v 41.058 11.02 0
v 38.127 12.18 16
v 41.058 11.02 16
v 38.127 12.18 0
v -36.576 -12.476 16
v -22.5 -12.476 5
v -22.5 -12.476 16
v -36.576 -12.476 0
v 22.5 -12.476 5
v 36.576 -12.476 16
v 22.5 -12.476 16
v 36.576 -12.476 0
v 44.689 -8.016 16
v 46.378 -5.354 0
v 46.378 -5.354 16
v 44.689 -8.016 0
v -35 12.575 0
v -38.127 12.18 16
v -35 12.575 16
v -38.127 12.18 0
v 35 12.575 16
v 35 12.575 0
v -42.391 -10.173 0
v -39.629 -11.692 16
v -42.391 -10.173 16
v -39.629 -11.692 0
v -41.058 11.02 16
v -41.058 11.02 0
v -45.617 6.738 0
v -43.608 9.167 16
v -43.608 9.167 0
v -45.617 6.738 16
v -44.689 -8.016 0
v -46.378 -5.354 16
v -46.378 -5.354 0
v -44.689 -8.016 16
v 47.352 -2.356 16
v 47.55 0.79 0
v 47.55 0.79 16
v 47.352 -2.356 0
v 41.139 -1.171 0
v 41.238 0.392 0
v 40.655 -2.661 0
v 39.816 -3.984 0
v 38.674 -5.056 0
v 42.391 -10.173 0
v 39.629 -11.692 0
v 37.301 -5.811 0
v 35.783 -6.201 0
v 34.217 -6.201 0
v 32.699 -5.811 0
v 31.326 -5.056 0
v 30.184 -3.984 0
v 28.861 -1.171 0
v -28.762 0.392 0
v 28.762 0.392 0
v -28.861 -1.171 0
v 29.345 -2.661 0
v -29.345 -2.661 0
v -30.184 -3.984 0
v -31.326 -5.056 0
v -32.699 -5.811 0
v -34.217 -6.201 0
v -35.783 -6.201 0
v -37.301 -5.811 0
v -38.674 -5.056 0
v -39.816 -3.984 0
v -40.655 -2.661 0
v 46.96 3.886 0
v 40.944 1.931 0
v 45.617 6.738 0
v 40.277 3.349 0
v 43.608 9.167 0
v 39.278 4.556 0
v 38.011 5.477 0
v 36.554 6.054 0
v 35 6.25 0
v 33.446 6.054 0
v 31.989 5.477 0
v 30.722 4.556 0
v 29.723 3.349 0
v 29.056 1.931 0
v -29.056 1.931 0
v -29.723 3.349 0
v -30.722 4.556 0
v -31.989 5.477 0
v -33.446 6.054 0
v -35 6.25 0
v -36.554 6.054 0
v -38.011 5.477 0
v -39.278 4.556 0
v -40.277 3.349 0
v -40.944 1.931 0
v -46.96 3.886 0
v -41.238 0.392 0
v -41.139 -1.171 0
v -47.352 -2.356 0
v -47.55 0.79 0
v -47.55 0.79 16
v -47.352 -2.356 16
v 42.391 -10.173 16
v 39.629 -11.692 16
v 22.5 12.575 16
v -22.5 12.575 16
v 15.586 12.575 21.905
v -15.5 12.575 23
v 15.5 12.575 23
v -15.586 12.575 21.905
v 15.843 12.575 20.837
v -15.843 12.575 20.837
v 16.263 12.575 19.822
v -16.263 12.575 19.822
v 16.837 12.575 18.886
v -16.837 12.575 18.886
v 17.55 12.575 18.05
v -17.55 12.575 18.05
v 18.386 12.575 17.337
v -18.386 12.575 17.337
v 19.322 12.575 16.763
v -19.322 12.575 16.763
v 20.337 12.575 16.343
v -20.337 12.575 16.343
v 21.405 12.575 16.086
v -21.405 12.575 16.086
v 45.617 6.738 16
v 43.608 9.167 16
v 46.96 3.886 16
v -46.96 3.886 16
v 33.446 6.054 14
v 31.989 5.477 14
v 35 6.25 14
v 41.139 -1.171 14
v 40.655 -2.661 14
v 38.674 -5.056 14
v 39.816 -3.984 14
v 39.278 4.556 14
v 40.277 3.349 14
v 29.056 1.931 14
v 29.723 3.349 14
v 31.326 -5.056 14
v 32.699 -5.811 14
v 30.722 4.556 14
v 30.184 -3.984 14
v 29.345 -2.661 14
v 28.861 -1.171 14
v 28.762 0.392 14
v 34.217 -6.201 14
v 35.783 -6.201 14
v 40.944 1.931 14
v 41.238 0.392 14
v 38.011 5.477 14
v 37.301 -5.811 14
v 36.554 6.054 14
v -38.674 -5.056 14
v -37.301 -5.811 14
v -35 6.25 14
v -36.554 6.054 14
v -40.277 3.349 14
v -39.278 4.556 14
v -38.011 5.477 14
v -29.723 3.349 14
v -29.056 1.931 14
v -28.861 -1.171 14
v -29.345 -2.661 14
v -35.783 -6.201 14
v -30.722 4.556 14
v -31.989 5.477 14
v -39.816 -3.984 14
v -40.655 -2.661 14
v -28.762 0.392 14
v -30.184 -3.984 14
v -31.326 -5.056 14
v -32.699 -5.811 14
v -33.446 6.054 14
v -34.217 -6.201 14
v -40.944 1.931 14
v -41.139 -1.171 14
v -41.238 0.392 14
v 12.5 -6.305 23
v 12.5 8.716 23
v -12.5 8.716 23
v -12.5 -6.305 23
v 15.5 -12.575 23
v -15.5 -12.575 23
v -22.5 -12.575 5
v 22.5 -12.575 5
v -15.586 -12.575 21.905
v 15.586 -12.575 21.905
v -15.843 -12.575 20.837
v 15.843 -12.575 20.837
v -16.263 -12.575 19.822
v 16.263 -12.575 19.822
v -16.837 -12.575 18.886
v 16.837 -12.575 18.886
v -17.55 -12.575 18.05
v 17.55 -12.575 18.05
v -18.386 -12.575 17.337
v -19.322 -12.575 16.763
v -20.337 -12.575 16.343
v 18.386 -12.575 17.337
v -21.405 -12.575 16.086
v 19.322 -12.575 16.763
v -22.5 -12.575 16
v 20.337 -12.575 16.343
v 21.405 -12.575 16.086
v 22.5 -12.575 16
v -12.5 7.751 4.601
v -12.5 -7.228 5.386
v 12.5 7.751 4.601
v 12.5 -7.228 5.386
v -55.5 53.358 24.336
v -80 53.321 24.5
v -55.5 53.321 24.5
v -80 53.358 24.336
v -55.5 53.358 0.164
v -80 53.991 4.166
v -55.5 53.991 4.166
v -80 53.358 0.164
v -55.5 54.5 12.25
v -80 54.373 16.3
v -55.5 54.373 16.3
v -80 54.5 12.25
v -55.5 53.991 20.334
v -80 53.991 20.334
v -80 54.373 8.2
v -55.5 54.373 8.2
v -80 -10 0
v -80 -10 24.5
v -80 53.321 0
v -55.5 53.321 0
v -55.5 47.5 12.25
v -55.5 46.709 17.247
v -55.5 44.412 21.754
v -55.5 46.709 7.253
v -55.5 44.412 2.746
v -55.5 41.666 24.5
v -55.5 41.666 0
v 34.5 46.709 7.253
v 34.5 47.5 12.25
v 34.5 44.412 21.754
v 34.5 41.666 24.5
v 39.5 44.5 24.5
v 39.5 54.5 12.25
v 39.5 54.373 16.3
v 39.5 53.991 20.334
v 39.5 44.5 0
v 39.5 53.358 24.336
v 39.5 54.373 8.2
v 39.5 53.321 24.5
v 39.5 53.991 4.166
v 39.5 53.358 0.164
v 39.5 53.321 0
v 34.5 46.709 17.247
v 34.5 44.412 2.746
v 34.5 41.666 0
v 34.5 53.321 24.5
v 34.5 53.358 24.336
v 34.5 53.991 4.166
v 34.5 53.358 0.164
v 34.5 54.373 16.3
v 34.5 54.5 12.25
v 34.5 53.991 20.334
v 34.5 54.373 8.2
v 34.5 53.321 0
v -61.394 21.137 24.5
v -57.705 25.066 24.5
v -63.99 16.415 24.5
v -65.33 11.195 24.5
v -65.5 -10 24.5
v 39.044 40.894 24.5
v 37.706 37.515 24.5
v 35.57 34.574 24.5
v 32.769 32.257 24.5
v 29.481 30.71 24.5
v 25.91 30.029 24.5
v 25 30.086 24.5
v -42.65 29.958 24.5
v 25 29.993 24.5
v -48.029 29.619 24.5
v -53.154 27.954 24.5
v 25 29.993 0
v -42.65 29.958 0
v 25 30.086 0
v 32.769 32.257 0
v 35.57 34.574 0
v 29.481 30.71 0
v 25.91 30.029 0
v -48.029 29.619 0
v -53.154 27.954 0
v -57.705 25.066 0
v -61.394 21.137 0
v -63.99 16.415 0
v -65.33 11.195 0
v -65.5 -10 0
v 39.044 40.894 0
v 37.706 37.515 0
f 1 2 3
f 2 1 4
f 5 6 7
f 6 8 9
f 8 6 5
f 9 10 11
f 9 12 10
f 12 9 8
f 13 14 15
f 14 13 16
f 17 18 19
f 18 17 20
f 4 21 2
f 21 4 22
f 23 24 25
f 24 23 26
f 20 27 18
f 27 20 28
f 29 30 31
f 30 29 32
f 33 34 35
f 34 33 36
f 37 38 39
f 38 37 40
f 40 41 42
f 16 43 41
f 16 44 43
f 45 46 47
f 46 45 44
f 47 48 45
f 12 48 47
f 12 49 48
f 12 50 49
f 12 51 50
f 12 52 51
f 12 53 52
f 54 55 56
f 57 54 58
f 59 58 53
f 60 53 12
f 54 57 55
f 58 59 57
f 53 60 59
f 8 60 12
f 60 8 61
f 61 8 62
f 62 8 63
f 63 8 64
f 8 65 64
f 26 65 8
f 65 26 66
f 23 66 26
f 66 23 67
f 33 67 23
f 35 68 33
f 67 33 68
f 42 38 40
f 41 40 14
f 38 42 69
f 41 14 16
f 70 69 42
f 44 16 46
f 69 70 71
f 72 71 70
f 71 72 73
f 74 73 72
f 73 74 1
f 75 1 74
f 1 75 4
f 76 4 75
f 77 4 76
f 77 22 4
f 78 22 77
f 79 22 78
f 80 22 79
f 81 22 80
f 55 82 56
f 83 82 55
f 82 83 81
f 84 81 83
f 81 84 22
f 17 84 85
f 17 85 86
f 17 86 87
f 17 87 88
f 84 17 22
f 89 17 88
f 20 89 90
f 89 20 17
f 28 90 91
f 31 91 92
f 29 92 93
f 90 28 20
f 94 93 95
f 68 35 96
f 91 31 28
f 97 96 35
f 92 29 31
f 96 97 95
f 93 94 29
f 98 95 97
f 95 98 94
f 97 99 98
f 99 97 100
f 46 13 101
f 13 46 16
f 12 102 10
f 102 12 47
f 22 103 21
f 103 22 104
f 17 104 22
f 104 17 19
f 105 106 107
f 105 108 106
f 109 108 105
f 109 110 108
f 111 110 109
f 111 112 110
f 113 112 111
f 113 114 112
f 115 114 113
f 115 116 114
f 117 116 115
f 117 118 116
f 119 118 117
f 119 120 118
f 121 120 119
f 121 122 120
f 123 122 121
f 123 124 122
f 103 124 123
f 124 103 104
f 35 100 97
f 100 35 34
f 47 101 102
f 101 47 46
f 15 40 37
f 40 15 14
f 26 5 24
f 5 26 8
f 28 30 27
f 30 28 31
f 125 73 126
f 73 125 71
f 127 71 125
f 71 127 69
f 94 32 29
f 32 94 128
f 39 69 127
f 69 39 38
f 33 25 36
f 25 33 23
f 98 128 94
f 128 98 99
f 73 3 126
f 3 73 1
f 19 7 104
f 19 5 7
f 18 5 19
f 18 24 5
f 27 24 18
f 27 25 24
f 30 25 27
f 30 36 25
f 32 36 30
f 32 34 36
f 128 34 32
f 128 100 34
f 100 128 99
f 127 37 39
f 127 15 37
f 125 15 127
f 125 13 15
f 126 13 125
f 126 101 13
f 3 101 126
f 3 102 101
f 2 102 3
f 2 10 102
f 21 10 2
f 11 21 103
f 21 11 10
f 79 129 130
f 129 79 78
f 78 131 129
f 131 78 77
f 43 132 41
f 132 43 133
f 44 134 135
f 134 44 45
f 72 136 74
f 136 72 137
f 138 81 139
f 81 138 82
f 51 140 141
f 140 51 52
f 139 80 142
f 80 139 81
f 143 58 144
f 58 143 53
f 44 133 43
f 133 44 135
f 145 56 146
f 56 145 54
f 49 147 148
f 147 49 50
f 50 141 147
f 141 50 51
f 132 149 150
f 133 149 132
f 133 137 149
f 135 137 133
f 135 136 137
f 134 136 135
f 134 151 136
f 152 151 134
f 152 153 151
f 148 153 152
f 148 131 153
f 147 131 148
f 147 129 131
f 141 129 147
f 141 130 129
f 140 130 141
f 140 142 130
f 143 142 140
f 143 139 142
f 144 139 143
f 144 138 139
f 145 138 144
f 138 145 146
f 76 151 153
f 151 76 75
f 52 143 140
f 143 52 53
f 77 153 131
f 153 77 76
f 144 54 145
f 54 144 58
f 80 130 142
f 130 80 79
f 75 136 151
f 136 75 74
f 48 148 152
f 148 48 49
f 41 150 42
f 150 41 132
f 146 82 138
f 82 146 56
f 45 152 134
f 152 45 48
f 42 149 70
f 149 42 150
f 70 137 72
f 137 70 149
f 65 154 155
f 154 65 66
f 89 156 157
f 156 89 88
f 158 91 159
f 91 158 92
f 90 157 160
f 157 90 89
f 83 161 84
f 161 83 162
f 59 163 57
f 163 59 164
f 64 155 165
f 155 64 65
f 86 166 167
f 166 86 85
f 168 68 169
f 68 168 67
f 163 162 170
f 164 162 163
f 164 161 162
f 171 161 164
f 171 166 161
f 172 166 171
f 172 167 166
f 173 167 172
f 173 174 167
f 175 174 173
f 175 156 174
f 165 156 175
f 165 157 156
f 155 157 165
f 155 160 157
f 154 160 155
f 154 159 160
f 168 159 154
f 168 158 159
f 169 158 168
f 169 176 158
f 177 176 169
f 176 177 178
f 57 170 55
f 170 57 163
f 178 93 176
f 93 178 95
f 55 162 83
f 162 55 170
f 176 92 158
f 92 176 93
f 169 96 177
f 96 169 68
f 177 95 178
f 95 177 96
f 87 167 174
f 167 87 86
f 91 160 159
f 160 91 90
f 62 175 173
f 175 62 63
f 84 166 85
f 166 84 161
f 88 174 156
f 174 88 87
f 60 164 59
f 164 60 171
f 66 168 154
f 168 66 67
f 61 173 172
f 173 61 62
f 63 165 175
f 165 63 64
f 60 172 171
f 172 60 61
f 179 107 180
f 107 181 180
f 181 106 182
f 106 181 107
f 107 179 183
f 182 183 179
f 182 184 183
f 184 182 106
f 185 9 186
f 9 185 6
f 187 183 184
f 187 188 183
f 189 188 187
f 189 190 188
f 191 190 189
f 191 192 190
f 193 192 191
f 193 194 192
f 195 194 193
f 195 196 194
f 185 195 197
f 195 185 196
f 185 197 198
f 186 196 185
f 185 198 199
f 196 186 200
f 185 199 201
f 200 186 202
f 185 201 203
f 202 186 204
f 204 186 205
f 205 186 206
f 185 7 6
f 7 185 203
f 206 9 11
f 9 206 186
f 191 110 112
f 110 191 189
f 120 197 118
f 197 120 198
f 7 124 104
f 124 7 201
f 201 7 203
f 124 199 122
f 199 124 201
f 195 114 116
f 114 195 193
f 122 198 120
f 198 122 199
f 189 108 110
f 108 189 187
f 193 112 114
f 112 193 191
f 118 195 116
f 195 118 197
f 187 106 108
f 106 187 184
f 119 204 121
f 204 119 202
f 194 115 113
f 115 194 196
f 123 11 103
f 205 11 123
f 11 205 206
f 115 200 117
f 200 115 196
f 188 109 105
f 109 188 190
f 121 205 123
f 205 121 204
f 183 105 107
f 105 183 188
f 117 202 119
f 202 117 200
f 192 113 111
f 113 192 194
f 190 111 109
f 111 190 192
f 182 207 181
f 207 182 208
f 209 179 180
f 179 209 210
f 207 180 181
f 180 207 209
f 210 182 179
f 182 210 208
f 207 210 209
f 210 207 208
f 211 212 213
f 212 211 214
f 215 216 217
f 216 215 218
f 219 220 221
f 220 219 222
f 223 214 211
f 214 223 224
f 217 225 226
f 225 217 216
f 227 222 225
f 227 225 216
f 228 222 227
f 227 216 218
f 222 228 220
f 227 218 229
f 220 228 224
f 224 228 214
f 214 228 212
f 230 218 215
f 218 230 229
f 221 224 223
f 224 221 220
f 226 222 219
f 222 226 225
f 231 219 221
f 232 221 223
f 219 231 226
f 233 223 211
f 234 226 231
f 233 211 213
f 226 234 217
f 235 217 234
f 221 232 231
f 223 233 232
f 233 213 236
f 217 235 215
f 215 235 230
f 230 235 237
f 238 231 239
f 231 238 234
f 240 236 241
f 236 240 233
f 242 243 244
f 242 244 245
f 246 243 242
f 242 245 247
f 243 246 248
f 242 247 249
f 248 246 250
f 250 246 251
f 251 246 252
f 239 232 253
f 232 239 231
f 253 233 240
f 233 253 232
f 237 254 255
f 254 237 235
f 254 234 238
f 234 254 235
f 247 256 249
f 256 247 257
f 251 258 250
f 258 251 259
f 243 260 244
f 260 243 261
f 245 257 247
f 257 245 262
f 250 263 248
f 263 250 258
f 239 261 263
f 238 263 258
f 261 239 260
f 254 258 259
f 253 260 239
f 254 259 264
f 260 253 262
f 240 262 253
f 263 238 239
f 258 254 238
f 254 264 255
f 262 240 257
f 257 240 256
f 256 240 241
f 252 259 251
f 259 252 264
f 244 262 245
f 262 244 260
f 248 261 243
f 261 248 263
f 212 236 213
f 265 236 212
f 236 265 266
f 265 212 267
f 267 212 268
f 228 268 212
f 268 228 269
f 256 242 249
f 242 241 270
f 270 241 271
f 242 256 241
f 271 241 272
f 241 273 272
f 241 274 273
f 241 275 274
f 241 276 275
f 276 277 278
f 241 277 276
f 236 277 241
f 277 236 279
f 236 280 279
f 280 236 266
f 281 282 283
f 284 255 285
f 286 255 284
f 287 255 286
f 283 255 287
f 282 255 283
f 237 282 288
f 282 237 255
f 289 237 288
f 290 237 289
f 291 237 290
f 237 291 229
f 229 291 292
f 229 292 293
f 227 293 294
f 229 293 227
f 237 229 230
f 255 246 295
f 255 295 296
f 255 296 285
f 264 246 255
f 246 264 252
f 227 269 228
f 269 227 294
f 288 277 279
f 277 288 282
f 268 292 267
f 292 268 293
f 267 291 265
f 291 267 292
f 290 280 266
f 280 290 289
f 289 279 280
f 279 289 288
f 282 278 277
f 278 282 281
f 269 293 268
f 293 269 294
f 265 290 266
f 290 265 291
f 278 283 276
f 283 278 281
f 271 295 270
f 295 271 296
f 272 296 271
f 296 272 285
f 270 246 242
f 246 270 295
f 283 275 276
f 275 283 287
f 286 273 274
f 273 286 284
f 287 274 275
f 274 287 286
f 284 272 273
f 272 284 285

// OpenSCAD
$fn = 25;

// Radius of Z-rods (adjust fit here)
R=6.25;

// Path width of single trace of plastic
w1=.4;

// Distance between Z-rods (center to center)
rods = 70;

//fit of 2 pieces
clearance = .5;

hole_x = 15;
hole_y = 25;
base_cap = 16;
arm_length = 90;
arm_height = 40;
arm_offset = 10;
lip_x = 5;
lip_y = 7;
hole_rim = 3;
slant = 3;
floor = 5;
rise = 7;

module tcube(x, y, z, tx = 0, ty = 0, tz = 0) {
	translate([tx, ty, tz]) {
		cube([x, y, z]);
	}
}

module tcyl(r, h, tx = 0, ty = 0, tz = 0, center = false, $fn = $fn) {
	translate([tx, ty, tz]) {
		cylinder(r = r, h = h, center = center, $fn = $fn);
	}
}

module ccube(x, y, z, ty = 0, tz = 0) {
	tcube(x, y, z, -x / 2, ty, tz);
}

module spool_holder(piece = "all") {

	center_r = R;
	h = base_cap;
	wall = w1 * 4;
	xr = center_r / 4;
	xbc = center_r + wall + xr;
	outer_r = xbc + xr + wall;

	module rodtop(xtz) {
	
		tcyl(center_r, h - 1, tz = -1);

	}

	module span() {
		difference() {
			hull() {
				tcyl(outer_r, h);
				tcyl(outer_r, h, ty = rods);
			}

			rodtop();

			translate([0, rods, 0]) {
				rodtop();
			}
		}
	}

	module arm() {
		thickness = hole_y - clearance;
		bar = hole_x - clearance;
		spindle_length = bar + arm_length + arm_offset + lip_x;
		spindle_depth = thickness;
		height = arm_height + spindle_depth;
		brace_r = bar + lip_y;
		t2 = thickness + 2;

		module L() {
			difference() {
				tcube(spindle_length, height, thickness);

				hull() {
					tcube(1, 1, t2, spindle_length, height - spindle_depth - 1, -1);
					tcube(1, 1, t2, spindle_length, -1, -1);
					tcube(1, 1, t2, bar, -1, -1);
					tcyl(brace_r, t2, bar + brace_r, height - spindle_depth - brace_r, -1);
				}

				tcube(bar + 1, bar + 1, t2, spindle_length - bar, height - spindle_depth - 1, -1);
			}
			tcyl(bar, thickness, spindle_length - bar, height - spindle_depth + bar);
		}

		module ring() {
			lip_r = height;
			spindle_r = thickness * .66;
			$fn = 100;
			ty = height - spindle_r - lip_y;

			tcyl(lip_r, bar + arm_offset, $fn = $fn);
			tcyl(spindle_r, spindle_length, ty = ty, $fn = 20);
			ccube(2 * spindle_r, ty, spindle_length );
			tcyl(lip_r, lip_x, tz = spindle_length - lip_x, $fn = $fn);
		}

		intersection() {
	
			translate([0, 0, thickness / 2]) {
				rotate([0, 90, 0]) {
					ring();
				}
			}

			L();
		}

	}

	module base() {
		w = 2 * outer_r;
		yy = hole_y + 2 * rise;

		module fillet(ty = 0) {
			translate([0, ty, rise + h]) {
				rotate([0, 90, 0]) {
					cylinder(r = rise, h = w + 2, center = true, $fn = 40);
				}
			}
		}

		difference() {
			union() {
				translate([0, -rods / 2, 0]) {
					span();
				}
				difference() {
					ccube(w, yy + 2 * hole_rim, h - floor + rise, -yy / 2 - hole_rim, floor);
					fillet(yy / 2 + hole_rim);
					fillet(-yy / 2 - hole_rim);
				}
			}
			rotate([0, slant, 0]) {
				ccube(hole_x, hole_y, h + rise + 1, -hole_y / 2, floor);
			}
		}

	}

	if (piece == "all") {
		rotate([0, 0, 90]) {
			base();
		}

		translate([-80, -10, 0]) {
			arm();
		}
	}

	if (piece == "arm") {
		arm();
	}

	if (piece == "base") {
		base();
	}

}

spool_holder();
